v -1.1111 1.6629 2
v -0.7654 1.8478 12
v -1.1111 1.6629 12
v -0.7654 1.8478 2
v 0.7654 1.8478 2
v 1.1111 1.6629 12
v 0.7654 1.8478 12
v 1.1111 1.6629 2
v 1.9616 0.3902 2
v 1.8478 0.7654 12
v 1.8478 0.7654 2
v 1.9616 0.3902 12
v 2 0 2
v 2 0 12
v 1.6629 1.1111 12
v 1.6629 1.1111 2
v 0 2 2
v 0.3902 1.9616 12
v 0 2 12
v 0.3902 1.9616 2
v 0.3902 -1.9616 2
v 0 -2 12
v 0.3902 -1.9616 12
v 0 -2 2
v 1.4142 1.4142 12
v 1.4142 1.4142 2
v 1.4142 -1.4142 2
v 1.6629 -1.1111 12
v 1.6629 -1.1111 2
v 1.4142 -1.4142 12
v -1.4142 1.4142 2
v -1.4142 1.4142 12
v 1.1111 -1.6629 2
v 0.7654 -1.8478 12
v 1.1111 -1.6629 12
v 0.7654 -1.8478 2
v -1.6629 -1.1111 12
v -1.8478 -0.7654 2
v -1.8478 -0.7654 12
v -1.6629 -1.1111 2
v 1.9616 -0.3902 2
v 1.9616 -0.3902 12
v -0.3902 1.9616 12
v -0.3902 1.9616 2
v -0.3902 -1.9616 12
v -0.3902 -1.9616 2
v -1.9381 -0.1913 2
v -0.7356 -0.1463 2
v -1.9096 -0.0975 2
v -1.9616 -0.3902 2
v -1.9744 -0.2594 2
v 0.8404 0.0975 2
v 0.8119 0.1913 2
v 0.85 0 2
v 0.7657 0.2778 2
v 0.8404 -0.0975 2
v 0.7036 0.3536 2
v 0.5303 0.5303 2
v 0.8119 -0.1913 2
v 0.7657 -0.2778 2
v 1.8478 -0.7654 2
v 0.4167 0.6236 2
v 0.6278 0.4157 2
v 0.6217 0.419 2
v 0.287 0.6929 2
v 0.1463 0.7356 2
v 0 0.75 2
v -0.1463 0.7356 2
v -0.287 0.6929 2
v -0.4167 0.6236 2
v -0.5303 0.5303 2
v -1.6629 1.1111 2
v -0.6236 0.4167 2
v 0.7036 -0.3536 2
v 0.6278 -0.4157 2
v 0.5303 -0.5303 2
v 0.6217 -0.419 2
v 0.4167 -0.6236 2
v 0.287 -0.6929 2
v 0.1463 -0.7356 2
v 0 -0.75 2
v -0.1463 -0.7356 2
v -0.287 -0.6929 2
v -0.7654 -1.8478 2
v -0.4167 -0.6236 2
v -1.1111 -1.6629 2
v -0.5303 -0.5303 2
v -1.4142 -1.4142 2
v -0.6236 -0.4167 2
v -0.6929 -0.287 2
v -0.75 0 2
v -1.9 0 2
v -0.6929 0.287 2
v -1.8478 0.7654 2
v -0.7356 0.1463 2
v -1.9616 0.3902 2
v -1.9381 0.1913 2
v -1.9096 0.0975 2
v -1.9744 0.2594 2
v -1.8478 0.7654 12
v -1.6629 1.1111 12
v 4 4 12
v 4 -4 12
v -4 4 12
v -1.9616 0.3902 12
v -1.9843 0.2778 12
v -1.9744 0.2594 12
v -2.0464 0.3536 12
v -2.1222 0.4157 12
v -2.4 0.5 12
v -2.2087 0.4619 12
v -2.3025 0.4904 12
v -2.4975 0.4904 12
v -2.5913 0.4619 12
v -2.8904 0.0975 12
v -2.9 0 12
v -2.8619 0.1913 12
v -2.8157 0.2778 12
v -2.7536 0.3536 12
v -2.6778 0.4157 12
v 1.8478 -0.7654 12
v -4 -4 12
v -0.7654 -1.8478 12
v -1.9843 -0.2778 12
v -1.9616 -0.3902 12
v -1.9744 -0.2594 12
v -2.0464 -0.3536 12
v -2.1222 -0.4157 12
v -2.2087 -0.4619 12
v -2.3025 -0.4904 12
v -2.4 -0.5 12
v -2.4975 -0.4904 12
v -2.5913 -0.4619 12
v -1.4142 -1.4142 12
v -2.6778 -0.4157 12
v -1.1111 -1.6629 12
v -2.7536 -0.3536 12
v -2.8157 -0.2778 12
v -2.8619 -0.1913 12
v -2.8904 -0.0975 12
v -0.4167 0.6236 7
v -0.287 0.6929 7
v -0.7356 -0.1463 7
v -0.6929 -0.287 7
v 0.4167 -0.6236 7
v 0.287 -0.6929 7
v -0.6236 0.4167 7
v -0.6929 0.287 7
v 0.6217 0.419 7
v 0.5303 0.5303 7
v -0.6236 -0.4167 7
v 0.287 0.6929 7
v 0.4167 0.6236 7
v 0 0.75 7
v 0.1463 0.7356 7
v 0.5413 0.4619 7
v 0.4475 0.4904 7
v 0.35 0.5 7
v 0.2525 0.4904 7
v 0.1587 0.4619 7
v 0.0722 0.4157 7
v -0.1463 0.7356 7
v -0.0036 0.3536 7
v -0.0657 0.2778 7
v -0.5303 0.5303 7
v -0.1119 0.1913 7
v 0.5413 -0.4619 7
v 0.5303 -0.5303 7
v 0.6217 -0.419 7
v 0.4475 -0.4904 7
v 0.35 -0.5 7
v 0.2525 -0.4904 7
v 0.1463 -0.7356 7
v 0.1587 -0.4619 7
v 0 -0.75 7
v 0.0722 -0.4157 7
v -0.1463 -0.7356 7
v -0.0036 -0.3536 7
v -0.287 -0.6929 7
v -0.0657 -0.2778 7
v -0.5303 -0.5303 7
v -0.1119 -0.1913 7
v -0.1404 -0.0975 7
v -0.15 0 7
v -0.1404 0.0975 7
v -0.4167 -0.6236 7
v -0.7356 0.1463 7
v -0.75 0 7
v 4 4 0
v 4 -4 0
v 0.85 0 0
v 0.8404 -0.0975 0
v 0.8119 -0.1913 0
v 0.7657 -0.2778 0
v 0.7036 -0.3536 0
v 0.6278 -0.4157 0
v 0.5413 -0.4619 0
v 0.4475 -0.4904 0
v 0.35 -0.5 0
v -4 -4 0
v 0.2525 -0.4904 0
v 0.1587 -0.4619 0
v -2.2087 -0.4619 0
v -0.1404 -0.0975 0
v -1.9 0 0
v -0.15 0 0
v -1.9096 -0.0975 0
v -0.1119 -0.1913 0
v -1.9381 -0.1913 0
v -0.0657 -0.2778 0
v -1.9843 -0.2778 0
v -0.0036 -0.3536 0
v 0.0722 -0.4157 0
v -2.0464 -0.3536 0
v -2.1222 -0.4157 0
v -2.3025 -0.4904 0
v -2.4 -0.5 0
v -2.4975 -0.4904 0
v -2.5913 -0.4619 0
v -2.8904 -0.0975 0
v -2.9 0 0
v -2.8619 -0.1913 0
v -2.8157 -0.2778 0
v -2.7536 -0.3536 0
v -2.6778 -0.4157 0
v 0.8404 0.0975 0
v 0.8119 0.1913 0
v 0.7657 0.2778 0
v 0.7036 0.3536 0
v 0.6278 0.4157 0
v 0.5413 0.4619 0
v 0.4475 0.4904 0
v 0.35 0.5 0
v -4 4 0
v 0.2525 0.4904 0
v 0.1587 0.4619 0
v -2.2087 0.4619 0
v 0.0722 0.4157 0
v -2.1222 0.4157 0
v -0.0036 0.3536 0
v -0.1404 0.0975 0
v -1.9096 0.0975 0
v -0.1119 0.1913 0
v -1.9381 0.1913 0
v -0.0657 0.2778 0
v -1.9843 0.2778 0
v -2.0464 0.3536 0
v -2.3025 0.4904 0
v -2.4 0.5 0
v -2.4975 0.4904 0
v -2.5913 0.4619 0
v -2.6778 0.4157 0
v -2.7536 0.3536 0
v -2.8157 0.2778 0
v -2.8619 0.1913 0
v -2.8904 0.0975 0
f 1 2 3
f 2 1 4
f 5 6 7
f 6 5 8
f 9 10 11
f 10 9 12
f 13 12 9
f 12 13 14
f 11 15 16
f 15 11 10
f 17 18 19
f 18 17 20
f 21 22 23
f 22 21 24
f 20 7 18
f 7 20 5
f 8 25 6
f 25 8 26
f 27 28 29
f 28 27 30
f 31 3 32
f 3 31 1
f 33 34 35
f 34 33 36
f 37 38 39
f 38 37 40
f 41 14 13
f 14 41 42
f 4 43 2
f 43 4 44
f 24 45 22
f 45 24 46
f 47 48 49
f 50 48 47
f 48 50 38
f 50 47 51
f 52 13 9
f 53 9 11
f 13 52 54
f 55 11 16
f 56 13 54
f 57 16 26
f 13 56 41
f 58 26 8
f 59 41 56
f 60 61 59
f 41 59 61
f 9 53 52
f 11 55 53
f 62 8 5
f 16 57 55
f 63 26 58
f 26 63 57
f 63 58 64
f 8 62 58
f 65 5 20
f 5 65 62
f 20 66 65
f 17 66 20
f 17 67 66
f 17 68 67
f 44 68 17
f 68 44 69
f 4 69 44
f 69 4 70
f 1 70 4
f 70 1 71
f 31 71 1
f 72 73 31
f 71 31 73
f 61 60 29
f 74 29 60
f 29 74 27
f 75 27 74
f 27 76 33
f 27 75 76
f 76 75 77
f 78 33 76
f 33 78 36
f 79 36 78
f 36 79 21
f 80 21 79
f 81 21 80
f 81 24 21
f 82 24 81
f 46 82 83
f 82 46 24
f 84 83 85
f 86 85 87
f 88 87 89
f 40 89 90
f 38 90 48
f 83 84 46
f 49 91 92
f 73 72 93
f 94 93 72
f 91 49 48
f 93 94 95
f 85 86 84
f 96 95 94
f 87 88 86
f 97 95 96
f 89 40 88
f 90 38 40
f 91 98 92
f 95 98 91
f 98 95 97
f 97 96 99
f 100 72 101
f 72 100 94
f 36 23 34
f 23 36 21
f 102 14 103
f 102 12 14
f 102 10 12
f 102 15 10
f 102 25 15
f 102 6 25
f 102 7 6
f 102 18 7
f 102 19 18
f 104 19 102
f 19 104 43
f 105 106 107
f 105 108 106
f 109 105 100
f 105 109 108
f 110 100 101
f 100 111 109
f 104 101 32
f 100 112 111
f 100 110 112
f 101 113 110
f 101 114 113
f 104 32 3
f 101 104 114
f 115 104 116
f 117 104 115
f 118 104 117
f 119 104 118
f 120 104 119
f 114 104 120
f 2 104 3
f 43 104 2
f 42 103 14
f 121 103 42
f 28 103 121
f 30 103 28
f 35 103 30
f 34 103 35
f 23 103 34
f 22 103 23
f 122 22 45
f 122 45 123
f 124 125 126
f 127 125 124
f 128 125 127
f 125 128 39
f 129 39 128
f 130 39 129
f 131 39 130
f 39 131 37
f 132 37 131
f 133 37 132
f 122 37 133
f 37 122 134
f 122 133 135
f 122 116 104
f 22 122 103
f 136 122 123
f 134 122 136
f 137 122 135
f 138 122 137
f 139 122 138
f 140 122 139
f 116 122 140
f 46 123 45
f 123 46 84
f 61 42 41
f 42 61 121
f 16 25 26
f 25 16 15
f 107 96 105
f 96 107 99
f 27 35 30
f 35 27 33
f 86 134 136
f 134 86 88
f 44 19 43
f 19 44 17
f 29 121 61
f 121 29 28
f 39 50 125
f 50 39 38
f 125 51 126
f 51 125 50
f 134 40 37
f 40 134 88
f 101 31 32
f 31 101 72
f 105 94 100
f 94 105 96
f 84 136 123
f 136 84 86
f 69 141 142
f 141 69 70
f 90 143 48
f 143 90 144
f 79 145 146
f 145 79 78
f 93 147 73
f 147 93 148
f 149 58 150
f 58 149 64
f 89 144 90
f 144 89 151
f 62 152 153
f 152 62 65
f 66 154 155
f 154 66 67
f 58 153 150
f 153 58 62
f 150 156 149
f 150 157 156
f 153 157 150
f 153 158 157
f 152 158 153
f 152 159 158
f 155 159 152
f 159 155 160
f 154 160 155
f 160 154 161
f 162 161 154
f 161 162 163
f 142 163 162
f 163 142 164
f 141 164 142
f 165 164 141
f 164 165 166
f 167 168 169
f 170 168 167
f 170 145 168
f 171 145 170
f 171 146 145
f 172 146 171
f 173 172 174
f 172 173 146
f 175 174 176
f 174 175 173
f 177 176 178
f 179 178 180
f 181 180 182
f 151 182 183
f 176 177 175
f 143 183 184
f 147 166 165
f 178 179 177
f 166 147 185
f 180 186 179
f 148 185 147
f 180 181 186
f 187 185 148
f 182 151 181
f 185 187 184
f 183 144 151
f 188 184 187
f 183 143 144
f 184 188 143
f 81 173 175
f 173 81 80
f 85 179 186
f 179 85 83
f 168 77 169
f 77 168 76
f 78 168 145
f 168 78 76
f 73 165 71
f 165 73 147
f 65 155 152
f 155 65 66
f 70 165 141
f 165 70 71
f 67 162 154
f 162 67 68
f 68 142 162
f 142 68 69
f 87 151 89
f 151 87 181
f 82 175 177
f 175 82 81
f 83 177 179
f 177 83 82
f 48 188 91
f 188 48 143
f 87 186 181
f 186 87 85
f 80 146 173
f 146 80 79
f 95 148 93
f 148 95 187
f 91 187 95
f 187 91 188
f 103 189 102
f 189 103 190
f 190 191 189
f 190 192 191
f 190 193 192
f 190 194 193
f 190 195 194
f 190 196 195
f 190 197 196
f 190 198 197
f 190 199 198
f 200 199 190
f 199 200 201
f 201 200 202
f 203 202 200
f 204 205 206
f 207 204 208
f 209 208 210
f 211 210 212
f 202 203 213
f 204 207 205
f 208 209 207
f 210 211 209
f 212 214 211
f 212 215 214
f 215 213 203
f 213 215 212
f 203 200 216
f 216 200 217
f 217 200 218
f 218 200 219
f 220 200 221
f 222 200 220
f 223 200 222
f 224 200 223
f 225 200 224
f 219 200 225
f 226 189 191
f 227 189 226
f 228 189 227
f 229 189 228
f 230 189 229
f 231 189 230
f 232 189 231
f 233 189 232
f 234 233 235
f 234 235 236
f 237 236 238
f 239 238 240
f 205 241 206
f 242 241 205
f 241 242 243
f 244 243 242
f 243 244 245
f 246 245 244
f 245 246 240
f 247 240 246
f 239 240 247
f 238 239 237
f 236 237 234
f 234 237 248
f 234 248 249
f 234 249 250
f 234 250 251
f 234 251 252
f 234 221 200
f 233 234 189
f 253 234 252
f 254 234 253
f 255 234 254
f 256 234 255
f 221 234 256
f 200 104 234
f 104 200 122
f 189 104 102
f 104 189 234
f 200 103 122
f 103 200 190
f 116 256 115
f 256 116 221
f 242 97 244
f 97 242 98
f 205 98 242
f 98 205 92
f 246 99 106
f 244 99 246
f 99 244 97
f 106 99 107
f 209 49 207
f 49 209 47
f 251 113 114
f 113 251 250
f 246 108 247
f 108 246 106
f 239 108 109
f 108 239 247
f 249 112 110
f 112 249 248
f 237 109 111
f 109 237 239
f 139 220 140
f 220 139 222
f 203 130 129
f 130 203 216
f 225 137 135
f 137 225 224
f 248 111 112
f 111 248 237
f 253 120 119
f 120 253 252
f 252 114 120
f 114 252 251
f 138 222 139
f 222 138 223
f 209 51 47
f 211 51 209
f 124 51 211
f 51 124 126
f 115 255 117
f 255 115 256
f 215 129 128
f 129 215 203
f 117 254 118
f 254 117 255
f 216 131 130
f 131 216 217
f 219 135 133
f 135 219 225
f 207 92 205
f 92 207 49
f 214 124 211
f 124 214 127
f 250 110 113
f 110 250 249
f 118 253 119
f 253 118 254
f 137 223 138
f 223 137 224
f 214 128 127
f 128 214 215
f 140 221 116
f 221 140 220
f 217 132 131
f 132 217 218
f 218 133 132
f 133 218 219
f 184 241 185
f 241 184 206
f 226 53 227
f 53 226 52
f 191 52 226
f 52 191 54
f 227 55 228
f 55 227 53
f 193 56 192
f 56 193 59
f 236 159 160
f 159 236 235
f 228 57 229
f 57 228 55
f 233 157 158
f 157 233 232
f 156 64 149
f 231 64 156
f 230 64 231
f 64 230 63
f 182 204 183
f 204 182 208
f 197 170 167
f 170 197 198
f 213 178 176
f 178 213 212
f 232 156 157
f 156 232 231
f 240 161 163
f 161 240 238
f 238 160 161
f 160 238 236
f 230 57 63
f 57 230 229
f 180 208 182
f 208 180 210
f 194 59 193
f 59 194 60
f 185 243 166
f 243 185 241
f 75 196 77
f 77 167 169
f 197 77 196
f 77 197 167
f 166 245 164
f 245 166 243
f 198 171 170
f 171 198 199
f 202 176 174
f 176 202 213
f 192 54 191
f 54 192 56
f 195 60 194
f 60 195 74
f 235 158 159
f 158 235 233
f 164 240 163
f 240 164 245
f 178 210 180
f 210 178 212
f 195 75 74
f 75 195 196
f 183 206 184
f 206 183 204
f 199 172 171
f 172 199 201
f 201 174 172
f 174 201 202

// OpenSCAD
_1_depth = 10;
_2_inner_depth = 5;
_3_outer_diameter = 4;
_4_inner_diameter = 1.5;
_5_wire_diameter = 1;
_6_wire_jut = 0.1;
_7_wall_thickness = 2;

module barrel_connector(
  depth = 10,
  inner_depth = 5,
  outer_diameter = 4,
  inner_diameter = 2,
  wire_diameter = 1.3,
  wire_jut = 0.1,
  wall_thickness = 2) {
  $fn=32;
  difference() {
    or = outer_diameter / 2;
    ir = inner_diameter / 2;
    wr = wire_diameter / 2;
    wt = wall_thickness;
    translate([-or-wt, -or-wt, 0]) 
      cube([2 * wt + outer_diameter, 2 * wt + outer_diameter, depth + wt]);
    translate([-or-wr+wire_jut, 0, 0])
      cylinder(r=wr, h=depth+wt);// outer wire
    translate([ir-wr+wire_jut, 0, 0])
      cylinder(r=wr, h=depth+wt);// inner wire
    translate([0, 0, wt])
      difference() {
        cylinder(r=or, h=depth); // outer barrel
        cylinder(r=ir, h=inner_depth); // inner barrel
      }
  }
}

barrel_connector(
  _1_depth,
  _2_inner_depth,
  _3_outer_diameter,
  _4_inner_diameter,
  _5_wire_diameter,
  _6_wire_jut,
  _7_wall_thickness);
